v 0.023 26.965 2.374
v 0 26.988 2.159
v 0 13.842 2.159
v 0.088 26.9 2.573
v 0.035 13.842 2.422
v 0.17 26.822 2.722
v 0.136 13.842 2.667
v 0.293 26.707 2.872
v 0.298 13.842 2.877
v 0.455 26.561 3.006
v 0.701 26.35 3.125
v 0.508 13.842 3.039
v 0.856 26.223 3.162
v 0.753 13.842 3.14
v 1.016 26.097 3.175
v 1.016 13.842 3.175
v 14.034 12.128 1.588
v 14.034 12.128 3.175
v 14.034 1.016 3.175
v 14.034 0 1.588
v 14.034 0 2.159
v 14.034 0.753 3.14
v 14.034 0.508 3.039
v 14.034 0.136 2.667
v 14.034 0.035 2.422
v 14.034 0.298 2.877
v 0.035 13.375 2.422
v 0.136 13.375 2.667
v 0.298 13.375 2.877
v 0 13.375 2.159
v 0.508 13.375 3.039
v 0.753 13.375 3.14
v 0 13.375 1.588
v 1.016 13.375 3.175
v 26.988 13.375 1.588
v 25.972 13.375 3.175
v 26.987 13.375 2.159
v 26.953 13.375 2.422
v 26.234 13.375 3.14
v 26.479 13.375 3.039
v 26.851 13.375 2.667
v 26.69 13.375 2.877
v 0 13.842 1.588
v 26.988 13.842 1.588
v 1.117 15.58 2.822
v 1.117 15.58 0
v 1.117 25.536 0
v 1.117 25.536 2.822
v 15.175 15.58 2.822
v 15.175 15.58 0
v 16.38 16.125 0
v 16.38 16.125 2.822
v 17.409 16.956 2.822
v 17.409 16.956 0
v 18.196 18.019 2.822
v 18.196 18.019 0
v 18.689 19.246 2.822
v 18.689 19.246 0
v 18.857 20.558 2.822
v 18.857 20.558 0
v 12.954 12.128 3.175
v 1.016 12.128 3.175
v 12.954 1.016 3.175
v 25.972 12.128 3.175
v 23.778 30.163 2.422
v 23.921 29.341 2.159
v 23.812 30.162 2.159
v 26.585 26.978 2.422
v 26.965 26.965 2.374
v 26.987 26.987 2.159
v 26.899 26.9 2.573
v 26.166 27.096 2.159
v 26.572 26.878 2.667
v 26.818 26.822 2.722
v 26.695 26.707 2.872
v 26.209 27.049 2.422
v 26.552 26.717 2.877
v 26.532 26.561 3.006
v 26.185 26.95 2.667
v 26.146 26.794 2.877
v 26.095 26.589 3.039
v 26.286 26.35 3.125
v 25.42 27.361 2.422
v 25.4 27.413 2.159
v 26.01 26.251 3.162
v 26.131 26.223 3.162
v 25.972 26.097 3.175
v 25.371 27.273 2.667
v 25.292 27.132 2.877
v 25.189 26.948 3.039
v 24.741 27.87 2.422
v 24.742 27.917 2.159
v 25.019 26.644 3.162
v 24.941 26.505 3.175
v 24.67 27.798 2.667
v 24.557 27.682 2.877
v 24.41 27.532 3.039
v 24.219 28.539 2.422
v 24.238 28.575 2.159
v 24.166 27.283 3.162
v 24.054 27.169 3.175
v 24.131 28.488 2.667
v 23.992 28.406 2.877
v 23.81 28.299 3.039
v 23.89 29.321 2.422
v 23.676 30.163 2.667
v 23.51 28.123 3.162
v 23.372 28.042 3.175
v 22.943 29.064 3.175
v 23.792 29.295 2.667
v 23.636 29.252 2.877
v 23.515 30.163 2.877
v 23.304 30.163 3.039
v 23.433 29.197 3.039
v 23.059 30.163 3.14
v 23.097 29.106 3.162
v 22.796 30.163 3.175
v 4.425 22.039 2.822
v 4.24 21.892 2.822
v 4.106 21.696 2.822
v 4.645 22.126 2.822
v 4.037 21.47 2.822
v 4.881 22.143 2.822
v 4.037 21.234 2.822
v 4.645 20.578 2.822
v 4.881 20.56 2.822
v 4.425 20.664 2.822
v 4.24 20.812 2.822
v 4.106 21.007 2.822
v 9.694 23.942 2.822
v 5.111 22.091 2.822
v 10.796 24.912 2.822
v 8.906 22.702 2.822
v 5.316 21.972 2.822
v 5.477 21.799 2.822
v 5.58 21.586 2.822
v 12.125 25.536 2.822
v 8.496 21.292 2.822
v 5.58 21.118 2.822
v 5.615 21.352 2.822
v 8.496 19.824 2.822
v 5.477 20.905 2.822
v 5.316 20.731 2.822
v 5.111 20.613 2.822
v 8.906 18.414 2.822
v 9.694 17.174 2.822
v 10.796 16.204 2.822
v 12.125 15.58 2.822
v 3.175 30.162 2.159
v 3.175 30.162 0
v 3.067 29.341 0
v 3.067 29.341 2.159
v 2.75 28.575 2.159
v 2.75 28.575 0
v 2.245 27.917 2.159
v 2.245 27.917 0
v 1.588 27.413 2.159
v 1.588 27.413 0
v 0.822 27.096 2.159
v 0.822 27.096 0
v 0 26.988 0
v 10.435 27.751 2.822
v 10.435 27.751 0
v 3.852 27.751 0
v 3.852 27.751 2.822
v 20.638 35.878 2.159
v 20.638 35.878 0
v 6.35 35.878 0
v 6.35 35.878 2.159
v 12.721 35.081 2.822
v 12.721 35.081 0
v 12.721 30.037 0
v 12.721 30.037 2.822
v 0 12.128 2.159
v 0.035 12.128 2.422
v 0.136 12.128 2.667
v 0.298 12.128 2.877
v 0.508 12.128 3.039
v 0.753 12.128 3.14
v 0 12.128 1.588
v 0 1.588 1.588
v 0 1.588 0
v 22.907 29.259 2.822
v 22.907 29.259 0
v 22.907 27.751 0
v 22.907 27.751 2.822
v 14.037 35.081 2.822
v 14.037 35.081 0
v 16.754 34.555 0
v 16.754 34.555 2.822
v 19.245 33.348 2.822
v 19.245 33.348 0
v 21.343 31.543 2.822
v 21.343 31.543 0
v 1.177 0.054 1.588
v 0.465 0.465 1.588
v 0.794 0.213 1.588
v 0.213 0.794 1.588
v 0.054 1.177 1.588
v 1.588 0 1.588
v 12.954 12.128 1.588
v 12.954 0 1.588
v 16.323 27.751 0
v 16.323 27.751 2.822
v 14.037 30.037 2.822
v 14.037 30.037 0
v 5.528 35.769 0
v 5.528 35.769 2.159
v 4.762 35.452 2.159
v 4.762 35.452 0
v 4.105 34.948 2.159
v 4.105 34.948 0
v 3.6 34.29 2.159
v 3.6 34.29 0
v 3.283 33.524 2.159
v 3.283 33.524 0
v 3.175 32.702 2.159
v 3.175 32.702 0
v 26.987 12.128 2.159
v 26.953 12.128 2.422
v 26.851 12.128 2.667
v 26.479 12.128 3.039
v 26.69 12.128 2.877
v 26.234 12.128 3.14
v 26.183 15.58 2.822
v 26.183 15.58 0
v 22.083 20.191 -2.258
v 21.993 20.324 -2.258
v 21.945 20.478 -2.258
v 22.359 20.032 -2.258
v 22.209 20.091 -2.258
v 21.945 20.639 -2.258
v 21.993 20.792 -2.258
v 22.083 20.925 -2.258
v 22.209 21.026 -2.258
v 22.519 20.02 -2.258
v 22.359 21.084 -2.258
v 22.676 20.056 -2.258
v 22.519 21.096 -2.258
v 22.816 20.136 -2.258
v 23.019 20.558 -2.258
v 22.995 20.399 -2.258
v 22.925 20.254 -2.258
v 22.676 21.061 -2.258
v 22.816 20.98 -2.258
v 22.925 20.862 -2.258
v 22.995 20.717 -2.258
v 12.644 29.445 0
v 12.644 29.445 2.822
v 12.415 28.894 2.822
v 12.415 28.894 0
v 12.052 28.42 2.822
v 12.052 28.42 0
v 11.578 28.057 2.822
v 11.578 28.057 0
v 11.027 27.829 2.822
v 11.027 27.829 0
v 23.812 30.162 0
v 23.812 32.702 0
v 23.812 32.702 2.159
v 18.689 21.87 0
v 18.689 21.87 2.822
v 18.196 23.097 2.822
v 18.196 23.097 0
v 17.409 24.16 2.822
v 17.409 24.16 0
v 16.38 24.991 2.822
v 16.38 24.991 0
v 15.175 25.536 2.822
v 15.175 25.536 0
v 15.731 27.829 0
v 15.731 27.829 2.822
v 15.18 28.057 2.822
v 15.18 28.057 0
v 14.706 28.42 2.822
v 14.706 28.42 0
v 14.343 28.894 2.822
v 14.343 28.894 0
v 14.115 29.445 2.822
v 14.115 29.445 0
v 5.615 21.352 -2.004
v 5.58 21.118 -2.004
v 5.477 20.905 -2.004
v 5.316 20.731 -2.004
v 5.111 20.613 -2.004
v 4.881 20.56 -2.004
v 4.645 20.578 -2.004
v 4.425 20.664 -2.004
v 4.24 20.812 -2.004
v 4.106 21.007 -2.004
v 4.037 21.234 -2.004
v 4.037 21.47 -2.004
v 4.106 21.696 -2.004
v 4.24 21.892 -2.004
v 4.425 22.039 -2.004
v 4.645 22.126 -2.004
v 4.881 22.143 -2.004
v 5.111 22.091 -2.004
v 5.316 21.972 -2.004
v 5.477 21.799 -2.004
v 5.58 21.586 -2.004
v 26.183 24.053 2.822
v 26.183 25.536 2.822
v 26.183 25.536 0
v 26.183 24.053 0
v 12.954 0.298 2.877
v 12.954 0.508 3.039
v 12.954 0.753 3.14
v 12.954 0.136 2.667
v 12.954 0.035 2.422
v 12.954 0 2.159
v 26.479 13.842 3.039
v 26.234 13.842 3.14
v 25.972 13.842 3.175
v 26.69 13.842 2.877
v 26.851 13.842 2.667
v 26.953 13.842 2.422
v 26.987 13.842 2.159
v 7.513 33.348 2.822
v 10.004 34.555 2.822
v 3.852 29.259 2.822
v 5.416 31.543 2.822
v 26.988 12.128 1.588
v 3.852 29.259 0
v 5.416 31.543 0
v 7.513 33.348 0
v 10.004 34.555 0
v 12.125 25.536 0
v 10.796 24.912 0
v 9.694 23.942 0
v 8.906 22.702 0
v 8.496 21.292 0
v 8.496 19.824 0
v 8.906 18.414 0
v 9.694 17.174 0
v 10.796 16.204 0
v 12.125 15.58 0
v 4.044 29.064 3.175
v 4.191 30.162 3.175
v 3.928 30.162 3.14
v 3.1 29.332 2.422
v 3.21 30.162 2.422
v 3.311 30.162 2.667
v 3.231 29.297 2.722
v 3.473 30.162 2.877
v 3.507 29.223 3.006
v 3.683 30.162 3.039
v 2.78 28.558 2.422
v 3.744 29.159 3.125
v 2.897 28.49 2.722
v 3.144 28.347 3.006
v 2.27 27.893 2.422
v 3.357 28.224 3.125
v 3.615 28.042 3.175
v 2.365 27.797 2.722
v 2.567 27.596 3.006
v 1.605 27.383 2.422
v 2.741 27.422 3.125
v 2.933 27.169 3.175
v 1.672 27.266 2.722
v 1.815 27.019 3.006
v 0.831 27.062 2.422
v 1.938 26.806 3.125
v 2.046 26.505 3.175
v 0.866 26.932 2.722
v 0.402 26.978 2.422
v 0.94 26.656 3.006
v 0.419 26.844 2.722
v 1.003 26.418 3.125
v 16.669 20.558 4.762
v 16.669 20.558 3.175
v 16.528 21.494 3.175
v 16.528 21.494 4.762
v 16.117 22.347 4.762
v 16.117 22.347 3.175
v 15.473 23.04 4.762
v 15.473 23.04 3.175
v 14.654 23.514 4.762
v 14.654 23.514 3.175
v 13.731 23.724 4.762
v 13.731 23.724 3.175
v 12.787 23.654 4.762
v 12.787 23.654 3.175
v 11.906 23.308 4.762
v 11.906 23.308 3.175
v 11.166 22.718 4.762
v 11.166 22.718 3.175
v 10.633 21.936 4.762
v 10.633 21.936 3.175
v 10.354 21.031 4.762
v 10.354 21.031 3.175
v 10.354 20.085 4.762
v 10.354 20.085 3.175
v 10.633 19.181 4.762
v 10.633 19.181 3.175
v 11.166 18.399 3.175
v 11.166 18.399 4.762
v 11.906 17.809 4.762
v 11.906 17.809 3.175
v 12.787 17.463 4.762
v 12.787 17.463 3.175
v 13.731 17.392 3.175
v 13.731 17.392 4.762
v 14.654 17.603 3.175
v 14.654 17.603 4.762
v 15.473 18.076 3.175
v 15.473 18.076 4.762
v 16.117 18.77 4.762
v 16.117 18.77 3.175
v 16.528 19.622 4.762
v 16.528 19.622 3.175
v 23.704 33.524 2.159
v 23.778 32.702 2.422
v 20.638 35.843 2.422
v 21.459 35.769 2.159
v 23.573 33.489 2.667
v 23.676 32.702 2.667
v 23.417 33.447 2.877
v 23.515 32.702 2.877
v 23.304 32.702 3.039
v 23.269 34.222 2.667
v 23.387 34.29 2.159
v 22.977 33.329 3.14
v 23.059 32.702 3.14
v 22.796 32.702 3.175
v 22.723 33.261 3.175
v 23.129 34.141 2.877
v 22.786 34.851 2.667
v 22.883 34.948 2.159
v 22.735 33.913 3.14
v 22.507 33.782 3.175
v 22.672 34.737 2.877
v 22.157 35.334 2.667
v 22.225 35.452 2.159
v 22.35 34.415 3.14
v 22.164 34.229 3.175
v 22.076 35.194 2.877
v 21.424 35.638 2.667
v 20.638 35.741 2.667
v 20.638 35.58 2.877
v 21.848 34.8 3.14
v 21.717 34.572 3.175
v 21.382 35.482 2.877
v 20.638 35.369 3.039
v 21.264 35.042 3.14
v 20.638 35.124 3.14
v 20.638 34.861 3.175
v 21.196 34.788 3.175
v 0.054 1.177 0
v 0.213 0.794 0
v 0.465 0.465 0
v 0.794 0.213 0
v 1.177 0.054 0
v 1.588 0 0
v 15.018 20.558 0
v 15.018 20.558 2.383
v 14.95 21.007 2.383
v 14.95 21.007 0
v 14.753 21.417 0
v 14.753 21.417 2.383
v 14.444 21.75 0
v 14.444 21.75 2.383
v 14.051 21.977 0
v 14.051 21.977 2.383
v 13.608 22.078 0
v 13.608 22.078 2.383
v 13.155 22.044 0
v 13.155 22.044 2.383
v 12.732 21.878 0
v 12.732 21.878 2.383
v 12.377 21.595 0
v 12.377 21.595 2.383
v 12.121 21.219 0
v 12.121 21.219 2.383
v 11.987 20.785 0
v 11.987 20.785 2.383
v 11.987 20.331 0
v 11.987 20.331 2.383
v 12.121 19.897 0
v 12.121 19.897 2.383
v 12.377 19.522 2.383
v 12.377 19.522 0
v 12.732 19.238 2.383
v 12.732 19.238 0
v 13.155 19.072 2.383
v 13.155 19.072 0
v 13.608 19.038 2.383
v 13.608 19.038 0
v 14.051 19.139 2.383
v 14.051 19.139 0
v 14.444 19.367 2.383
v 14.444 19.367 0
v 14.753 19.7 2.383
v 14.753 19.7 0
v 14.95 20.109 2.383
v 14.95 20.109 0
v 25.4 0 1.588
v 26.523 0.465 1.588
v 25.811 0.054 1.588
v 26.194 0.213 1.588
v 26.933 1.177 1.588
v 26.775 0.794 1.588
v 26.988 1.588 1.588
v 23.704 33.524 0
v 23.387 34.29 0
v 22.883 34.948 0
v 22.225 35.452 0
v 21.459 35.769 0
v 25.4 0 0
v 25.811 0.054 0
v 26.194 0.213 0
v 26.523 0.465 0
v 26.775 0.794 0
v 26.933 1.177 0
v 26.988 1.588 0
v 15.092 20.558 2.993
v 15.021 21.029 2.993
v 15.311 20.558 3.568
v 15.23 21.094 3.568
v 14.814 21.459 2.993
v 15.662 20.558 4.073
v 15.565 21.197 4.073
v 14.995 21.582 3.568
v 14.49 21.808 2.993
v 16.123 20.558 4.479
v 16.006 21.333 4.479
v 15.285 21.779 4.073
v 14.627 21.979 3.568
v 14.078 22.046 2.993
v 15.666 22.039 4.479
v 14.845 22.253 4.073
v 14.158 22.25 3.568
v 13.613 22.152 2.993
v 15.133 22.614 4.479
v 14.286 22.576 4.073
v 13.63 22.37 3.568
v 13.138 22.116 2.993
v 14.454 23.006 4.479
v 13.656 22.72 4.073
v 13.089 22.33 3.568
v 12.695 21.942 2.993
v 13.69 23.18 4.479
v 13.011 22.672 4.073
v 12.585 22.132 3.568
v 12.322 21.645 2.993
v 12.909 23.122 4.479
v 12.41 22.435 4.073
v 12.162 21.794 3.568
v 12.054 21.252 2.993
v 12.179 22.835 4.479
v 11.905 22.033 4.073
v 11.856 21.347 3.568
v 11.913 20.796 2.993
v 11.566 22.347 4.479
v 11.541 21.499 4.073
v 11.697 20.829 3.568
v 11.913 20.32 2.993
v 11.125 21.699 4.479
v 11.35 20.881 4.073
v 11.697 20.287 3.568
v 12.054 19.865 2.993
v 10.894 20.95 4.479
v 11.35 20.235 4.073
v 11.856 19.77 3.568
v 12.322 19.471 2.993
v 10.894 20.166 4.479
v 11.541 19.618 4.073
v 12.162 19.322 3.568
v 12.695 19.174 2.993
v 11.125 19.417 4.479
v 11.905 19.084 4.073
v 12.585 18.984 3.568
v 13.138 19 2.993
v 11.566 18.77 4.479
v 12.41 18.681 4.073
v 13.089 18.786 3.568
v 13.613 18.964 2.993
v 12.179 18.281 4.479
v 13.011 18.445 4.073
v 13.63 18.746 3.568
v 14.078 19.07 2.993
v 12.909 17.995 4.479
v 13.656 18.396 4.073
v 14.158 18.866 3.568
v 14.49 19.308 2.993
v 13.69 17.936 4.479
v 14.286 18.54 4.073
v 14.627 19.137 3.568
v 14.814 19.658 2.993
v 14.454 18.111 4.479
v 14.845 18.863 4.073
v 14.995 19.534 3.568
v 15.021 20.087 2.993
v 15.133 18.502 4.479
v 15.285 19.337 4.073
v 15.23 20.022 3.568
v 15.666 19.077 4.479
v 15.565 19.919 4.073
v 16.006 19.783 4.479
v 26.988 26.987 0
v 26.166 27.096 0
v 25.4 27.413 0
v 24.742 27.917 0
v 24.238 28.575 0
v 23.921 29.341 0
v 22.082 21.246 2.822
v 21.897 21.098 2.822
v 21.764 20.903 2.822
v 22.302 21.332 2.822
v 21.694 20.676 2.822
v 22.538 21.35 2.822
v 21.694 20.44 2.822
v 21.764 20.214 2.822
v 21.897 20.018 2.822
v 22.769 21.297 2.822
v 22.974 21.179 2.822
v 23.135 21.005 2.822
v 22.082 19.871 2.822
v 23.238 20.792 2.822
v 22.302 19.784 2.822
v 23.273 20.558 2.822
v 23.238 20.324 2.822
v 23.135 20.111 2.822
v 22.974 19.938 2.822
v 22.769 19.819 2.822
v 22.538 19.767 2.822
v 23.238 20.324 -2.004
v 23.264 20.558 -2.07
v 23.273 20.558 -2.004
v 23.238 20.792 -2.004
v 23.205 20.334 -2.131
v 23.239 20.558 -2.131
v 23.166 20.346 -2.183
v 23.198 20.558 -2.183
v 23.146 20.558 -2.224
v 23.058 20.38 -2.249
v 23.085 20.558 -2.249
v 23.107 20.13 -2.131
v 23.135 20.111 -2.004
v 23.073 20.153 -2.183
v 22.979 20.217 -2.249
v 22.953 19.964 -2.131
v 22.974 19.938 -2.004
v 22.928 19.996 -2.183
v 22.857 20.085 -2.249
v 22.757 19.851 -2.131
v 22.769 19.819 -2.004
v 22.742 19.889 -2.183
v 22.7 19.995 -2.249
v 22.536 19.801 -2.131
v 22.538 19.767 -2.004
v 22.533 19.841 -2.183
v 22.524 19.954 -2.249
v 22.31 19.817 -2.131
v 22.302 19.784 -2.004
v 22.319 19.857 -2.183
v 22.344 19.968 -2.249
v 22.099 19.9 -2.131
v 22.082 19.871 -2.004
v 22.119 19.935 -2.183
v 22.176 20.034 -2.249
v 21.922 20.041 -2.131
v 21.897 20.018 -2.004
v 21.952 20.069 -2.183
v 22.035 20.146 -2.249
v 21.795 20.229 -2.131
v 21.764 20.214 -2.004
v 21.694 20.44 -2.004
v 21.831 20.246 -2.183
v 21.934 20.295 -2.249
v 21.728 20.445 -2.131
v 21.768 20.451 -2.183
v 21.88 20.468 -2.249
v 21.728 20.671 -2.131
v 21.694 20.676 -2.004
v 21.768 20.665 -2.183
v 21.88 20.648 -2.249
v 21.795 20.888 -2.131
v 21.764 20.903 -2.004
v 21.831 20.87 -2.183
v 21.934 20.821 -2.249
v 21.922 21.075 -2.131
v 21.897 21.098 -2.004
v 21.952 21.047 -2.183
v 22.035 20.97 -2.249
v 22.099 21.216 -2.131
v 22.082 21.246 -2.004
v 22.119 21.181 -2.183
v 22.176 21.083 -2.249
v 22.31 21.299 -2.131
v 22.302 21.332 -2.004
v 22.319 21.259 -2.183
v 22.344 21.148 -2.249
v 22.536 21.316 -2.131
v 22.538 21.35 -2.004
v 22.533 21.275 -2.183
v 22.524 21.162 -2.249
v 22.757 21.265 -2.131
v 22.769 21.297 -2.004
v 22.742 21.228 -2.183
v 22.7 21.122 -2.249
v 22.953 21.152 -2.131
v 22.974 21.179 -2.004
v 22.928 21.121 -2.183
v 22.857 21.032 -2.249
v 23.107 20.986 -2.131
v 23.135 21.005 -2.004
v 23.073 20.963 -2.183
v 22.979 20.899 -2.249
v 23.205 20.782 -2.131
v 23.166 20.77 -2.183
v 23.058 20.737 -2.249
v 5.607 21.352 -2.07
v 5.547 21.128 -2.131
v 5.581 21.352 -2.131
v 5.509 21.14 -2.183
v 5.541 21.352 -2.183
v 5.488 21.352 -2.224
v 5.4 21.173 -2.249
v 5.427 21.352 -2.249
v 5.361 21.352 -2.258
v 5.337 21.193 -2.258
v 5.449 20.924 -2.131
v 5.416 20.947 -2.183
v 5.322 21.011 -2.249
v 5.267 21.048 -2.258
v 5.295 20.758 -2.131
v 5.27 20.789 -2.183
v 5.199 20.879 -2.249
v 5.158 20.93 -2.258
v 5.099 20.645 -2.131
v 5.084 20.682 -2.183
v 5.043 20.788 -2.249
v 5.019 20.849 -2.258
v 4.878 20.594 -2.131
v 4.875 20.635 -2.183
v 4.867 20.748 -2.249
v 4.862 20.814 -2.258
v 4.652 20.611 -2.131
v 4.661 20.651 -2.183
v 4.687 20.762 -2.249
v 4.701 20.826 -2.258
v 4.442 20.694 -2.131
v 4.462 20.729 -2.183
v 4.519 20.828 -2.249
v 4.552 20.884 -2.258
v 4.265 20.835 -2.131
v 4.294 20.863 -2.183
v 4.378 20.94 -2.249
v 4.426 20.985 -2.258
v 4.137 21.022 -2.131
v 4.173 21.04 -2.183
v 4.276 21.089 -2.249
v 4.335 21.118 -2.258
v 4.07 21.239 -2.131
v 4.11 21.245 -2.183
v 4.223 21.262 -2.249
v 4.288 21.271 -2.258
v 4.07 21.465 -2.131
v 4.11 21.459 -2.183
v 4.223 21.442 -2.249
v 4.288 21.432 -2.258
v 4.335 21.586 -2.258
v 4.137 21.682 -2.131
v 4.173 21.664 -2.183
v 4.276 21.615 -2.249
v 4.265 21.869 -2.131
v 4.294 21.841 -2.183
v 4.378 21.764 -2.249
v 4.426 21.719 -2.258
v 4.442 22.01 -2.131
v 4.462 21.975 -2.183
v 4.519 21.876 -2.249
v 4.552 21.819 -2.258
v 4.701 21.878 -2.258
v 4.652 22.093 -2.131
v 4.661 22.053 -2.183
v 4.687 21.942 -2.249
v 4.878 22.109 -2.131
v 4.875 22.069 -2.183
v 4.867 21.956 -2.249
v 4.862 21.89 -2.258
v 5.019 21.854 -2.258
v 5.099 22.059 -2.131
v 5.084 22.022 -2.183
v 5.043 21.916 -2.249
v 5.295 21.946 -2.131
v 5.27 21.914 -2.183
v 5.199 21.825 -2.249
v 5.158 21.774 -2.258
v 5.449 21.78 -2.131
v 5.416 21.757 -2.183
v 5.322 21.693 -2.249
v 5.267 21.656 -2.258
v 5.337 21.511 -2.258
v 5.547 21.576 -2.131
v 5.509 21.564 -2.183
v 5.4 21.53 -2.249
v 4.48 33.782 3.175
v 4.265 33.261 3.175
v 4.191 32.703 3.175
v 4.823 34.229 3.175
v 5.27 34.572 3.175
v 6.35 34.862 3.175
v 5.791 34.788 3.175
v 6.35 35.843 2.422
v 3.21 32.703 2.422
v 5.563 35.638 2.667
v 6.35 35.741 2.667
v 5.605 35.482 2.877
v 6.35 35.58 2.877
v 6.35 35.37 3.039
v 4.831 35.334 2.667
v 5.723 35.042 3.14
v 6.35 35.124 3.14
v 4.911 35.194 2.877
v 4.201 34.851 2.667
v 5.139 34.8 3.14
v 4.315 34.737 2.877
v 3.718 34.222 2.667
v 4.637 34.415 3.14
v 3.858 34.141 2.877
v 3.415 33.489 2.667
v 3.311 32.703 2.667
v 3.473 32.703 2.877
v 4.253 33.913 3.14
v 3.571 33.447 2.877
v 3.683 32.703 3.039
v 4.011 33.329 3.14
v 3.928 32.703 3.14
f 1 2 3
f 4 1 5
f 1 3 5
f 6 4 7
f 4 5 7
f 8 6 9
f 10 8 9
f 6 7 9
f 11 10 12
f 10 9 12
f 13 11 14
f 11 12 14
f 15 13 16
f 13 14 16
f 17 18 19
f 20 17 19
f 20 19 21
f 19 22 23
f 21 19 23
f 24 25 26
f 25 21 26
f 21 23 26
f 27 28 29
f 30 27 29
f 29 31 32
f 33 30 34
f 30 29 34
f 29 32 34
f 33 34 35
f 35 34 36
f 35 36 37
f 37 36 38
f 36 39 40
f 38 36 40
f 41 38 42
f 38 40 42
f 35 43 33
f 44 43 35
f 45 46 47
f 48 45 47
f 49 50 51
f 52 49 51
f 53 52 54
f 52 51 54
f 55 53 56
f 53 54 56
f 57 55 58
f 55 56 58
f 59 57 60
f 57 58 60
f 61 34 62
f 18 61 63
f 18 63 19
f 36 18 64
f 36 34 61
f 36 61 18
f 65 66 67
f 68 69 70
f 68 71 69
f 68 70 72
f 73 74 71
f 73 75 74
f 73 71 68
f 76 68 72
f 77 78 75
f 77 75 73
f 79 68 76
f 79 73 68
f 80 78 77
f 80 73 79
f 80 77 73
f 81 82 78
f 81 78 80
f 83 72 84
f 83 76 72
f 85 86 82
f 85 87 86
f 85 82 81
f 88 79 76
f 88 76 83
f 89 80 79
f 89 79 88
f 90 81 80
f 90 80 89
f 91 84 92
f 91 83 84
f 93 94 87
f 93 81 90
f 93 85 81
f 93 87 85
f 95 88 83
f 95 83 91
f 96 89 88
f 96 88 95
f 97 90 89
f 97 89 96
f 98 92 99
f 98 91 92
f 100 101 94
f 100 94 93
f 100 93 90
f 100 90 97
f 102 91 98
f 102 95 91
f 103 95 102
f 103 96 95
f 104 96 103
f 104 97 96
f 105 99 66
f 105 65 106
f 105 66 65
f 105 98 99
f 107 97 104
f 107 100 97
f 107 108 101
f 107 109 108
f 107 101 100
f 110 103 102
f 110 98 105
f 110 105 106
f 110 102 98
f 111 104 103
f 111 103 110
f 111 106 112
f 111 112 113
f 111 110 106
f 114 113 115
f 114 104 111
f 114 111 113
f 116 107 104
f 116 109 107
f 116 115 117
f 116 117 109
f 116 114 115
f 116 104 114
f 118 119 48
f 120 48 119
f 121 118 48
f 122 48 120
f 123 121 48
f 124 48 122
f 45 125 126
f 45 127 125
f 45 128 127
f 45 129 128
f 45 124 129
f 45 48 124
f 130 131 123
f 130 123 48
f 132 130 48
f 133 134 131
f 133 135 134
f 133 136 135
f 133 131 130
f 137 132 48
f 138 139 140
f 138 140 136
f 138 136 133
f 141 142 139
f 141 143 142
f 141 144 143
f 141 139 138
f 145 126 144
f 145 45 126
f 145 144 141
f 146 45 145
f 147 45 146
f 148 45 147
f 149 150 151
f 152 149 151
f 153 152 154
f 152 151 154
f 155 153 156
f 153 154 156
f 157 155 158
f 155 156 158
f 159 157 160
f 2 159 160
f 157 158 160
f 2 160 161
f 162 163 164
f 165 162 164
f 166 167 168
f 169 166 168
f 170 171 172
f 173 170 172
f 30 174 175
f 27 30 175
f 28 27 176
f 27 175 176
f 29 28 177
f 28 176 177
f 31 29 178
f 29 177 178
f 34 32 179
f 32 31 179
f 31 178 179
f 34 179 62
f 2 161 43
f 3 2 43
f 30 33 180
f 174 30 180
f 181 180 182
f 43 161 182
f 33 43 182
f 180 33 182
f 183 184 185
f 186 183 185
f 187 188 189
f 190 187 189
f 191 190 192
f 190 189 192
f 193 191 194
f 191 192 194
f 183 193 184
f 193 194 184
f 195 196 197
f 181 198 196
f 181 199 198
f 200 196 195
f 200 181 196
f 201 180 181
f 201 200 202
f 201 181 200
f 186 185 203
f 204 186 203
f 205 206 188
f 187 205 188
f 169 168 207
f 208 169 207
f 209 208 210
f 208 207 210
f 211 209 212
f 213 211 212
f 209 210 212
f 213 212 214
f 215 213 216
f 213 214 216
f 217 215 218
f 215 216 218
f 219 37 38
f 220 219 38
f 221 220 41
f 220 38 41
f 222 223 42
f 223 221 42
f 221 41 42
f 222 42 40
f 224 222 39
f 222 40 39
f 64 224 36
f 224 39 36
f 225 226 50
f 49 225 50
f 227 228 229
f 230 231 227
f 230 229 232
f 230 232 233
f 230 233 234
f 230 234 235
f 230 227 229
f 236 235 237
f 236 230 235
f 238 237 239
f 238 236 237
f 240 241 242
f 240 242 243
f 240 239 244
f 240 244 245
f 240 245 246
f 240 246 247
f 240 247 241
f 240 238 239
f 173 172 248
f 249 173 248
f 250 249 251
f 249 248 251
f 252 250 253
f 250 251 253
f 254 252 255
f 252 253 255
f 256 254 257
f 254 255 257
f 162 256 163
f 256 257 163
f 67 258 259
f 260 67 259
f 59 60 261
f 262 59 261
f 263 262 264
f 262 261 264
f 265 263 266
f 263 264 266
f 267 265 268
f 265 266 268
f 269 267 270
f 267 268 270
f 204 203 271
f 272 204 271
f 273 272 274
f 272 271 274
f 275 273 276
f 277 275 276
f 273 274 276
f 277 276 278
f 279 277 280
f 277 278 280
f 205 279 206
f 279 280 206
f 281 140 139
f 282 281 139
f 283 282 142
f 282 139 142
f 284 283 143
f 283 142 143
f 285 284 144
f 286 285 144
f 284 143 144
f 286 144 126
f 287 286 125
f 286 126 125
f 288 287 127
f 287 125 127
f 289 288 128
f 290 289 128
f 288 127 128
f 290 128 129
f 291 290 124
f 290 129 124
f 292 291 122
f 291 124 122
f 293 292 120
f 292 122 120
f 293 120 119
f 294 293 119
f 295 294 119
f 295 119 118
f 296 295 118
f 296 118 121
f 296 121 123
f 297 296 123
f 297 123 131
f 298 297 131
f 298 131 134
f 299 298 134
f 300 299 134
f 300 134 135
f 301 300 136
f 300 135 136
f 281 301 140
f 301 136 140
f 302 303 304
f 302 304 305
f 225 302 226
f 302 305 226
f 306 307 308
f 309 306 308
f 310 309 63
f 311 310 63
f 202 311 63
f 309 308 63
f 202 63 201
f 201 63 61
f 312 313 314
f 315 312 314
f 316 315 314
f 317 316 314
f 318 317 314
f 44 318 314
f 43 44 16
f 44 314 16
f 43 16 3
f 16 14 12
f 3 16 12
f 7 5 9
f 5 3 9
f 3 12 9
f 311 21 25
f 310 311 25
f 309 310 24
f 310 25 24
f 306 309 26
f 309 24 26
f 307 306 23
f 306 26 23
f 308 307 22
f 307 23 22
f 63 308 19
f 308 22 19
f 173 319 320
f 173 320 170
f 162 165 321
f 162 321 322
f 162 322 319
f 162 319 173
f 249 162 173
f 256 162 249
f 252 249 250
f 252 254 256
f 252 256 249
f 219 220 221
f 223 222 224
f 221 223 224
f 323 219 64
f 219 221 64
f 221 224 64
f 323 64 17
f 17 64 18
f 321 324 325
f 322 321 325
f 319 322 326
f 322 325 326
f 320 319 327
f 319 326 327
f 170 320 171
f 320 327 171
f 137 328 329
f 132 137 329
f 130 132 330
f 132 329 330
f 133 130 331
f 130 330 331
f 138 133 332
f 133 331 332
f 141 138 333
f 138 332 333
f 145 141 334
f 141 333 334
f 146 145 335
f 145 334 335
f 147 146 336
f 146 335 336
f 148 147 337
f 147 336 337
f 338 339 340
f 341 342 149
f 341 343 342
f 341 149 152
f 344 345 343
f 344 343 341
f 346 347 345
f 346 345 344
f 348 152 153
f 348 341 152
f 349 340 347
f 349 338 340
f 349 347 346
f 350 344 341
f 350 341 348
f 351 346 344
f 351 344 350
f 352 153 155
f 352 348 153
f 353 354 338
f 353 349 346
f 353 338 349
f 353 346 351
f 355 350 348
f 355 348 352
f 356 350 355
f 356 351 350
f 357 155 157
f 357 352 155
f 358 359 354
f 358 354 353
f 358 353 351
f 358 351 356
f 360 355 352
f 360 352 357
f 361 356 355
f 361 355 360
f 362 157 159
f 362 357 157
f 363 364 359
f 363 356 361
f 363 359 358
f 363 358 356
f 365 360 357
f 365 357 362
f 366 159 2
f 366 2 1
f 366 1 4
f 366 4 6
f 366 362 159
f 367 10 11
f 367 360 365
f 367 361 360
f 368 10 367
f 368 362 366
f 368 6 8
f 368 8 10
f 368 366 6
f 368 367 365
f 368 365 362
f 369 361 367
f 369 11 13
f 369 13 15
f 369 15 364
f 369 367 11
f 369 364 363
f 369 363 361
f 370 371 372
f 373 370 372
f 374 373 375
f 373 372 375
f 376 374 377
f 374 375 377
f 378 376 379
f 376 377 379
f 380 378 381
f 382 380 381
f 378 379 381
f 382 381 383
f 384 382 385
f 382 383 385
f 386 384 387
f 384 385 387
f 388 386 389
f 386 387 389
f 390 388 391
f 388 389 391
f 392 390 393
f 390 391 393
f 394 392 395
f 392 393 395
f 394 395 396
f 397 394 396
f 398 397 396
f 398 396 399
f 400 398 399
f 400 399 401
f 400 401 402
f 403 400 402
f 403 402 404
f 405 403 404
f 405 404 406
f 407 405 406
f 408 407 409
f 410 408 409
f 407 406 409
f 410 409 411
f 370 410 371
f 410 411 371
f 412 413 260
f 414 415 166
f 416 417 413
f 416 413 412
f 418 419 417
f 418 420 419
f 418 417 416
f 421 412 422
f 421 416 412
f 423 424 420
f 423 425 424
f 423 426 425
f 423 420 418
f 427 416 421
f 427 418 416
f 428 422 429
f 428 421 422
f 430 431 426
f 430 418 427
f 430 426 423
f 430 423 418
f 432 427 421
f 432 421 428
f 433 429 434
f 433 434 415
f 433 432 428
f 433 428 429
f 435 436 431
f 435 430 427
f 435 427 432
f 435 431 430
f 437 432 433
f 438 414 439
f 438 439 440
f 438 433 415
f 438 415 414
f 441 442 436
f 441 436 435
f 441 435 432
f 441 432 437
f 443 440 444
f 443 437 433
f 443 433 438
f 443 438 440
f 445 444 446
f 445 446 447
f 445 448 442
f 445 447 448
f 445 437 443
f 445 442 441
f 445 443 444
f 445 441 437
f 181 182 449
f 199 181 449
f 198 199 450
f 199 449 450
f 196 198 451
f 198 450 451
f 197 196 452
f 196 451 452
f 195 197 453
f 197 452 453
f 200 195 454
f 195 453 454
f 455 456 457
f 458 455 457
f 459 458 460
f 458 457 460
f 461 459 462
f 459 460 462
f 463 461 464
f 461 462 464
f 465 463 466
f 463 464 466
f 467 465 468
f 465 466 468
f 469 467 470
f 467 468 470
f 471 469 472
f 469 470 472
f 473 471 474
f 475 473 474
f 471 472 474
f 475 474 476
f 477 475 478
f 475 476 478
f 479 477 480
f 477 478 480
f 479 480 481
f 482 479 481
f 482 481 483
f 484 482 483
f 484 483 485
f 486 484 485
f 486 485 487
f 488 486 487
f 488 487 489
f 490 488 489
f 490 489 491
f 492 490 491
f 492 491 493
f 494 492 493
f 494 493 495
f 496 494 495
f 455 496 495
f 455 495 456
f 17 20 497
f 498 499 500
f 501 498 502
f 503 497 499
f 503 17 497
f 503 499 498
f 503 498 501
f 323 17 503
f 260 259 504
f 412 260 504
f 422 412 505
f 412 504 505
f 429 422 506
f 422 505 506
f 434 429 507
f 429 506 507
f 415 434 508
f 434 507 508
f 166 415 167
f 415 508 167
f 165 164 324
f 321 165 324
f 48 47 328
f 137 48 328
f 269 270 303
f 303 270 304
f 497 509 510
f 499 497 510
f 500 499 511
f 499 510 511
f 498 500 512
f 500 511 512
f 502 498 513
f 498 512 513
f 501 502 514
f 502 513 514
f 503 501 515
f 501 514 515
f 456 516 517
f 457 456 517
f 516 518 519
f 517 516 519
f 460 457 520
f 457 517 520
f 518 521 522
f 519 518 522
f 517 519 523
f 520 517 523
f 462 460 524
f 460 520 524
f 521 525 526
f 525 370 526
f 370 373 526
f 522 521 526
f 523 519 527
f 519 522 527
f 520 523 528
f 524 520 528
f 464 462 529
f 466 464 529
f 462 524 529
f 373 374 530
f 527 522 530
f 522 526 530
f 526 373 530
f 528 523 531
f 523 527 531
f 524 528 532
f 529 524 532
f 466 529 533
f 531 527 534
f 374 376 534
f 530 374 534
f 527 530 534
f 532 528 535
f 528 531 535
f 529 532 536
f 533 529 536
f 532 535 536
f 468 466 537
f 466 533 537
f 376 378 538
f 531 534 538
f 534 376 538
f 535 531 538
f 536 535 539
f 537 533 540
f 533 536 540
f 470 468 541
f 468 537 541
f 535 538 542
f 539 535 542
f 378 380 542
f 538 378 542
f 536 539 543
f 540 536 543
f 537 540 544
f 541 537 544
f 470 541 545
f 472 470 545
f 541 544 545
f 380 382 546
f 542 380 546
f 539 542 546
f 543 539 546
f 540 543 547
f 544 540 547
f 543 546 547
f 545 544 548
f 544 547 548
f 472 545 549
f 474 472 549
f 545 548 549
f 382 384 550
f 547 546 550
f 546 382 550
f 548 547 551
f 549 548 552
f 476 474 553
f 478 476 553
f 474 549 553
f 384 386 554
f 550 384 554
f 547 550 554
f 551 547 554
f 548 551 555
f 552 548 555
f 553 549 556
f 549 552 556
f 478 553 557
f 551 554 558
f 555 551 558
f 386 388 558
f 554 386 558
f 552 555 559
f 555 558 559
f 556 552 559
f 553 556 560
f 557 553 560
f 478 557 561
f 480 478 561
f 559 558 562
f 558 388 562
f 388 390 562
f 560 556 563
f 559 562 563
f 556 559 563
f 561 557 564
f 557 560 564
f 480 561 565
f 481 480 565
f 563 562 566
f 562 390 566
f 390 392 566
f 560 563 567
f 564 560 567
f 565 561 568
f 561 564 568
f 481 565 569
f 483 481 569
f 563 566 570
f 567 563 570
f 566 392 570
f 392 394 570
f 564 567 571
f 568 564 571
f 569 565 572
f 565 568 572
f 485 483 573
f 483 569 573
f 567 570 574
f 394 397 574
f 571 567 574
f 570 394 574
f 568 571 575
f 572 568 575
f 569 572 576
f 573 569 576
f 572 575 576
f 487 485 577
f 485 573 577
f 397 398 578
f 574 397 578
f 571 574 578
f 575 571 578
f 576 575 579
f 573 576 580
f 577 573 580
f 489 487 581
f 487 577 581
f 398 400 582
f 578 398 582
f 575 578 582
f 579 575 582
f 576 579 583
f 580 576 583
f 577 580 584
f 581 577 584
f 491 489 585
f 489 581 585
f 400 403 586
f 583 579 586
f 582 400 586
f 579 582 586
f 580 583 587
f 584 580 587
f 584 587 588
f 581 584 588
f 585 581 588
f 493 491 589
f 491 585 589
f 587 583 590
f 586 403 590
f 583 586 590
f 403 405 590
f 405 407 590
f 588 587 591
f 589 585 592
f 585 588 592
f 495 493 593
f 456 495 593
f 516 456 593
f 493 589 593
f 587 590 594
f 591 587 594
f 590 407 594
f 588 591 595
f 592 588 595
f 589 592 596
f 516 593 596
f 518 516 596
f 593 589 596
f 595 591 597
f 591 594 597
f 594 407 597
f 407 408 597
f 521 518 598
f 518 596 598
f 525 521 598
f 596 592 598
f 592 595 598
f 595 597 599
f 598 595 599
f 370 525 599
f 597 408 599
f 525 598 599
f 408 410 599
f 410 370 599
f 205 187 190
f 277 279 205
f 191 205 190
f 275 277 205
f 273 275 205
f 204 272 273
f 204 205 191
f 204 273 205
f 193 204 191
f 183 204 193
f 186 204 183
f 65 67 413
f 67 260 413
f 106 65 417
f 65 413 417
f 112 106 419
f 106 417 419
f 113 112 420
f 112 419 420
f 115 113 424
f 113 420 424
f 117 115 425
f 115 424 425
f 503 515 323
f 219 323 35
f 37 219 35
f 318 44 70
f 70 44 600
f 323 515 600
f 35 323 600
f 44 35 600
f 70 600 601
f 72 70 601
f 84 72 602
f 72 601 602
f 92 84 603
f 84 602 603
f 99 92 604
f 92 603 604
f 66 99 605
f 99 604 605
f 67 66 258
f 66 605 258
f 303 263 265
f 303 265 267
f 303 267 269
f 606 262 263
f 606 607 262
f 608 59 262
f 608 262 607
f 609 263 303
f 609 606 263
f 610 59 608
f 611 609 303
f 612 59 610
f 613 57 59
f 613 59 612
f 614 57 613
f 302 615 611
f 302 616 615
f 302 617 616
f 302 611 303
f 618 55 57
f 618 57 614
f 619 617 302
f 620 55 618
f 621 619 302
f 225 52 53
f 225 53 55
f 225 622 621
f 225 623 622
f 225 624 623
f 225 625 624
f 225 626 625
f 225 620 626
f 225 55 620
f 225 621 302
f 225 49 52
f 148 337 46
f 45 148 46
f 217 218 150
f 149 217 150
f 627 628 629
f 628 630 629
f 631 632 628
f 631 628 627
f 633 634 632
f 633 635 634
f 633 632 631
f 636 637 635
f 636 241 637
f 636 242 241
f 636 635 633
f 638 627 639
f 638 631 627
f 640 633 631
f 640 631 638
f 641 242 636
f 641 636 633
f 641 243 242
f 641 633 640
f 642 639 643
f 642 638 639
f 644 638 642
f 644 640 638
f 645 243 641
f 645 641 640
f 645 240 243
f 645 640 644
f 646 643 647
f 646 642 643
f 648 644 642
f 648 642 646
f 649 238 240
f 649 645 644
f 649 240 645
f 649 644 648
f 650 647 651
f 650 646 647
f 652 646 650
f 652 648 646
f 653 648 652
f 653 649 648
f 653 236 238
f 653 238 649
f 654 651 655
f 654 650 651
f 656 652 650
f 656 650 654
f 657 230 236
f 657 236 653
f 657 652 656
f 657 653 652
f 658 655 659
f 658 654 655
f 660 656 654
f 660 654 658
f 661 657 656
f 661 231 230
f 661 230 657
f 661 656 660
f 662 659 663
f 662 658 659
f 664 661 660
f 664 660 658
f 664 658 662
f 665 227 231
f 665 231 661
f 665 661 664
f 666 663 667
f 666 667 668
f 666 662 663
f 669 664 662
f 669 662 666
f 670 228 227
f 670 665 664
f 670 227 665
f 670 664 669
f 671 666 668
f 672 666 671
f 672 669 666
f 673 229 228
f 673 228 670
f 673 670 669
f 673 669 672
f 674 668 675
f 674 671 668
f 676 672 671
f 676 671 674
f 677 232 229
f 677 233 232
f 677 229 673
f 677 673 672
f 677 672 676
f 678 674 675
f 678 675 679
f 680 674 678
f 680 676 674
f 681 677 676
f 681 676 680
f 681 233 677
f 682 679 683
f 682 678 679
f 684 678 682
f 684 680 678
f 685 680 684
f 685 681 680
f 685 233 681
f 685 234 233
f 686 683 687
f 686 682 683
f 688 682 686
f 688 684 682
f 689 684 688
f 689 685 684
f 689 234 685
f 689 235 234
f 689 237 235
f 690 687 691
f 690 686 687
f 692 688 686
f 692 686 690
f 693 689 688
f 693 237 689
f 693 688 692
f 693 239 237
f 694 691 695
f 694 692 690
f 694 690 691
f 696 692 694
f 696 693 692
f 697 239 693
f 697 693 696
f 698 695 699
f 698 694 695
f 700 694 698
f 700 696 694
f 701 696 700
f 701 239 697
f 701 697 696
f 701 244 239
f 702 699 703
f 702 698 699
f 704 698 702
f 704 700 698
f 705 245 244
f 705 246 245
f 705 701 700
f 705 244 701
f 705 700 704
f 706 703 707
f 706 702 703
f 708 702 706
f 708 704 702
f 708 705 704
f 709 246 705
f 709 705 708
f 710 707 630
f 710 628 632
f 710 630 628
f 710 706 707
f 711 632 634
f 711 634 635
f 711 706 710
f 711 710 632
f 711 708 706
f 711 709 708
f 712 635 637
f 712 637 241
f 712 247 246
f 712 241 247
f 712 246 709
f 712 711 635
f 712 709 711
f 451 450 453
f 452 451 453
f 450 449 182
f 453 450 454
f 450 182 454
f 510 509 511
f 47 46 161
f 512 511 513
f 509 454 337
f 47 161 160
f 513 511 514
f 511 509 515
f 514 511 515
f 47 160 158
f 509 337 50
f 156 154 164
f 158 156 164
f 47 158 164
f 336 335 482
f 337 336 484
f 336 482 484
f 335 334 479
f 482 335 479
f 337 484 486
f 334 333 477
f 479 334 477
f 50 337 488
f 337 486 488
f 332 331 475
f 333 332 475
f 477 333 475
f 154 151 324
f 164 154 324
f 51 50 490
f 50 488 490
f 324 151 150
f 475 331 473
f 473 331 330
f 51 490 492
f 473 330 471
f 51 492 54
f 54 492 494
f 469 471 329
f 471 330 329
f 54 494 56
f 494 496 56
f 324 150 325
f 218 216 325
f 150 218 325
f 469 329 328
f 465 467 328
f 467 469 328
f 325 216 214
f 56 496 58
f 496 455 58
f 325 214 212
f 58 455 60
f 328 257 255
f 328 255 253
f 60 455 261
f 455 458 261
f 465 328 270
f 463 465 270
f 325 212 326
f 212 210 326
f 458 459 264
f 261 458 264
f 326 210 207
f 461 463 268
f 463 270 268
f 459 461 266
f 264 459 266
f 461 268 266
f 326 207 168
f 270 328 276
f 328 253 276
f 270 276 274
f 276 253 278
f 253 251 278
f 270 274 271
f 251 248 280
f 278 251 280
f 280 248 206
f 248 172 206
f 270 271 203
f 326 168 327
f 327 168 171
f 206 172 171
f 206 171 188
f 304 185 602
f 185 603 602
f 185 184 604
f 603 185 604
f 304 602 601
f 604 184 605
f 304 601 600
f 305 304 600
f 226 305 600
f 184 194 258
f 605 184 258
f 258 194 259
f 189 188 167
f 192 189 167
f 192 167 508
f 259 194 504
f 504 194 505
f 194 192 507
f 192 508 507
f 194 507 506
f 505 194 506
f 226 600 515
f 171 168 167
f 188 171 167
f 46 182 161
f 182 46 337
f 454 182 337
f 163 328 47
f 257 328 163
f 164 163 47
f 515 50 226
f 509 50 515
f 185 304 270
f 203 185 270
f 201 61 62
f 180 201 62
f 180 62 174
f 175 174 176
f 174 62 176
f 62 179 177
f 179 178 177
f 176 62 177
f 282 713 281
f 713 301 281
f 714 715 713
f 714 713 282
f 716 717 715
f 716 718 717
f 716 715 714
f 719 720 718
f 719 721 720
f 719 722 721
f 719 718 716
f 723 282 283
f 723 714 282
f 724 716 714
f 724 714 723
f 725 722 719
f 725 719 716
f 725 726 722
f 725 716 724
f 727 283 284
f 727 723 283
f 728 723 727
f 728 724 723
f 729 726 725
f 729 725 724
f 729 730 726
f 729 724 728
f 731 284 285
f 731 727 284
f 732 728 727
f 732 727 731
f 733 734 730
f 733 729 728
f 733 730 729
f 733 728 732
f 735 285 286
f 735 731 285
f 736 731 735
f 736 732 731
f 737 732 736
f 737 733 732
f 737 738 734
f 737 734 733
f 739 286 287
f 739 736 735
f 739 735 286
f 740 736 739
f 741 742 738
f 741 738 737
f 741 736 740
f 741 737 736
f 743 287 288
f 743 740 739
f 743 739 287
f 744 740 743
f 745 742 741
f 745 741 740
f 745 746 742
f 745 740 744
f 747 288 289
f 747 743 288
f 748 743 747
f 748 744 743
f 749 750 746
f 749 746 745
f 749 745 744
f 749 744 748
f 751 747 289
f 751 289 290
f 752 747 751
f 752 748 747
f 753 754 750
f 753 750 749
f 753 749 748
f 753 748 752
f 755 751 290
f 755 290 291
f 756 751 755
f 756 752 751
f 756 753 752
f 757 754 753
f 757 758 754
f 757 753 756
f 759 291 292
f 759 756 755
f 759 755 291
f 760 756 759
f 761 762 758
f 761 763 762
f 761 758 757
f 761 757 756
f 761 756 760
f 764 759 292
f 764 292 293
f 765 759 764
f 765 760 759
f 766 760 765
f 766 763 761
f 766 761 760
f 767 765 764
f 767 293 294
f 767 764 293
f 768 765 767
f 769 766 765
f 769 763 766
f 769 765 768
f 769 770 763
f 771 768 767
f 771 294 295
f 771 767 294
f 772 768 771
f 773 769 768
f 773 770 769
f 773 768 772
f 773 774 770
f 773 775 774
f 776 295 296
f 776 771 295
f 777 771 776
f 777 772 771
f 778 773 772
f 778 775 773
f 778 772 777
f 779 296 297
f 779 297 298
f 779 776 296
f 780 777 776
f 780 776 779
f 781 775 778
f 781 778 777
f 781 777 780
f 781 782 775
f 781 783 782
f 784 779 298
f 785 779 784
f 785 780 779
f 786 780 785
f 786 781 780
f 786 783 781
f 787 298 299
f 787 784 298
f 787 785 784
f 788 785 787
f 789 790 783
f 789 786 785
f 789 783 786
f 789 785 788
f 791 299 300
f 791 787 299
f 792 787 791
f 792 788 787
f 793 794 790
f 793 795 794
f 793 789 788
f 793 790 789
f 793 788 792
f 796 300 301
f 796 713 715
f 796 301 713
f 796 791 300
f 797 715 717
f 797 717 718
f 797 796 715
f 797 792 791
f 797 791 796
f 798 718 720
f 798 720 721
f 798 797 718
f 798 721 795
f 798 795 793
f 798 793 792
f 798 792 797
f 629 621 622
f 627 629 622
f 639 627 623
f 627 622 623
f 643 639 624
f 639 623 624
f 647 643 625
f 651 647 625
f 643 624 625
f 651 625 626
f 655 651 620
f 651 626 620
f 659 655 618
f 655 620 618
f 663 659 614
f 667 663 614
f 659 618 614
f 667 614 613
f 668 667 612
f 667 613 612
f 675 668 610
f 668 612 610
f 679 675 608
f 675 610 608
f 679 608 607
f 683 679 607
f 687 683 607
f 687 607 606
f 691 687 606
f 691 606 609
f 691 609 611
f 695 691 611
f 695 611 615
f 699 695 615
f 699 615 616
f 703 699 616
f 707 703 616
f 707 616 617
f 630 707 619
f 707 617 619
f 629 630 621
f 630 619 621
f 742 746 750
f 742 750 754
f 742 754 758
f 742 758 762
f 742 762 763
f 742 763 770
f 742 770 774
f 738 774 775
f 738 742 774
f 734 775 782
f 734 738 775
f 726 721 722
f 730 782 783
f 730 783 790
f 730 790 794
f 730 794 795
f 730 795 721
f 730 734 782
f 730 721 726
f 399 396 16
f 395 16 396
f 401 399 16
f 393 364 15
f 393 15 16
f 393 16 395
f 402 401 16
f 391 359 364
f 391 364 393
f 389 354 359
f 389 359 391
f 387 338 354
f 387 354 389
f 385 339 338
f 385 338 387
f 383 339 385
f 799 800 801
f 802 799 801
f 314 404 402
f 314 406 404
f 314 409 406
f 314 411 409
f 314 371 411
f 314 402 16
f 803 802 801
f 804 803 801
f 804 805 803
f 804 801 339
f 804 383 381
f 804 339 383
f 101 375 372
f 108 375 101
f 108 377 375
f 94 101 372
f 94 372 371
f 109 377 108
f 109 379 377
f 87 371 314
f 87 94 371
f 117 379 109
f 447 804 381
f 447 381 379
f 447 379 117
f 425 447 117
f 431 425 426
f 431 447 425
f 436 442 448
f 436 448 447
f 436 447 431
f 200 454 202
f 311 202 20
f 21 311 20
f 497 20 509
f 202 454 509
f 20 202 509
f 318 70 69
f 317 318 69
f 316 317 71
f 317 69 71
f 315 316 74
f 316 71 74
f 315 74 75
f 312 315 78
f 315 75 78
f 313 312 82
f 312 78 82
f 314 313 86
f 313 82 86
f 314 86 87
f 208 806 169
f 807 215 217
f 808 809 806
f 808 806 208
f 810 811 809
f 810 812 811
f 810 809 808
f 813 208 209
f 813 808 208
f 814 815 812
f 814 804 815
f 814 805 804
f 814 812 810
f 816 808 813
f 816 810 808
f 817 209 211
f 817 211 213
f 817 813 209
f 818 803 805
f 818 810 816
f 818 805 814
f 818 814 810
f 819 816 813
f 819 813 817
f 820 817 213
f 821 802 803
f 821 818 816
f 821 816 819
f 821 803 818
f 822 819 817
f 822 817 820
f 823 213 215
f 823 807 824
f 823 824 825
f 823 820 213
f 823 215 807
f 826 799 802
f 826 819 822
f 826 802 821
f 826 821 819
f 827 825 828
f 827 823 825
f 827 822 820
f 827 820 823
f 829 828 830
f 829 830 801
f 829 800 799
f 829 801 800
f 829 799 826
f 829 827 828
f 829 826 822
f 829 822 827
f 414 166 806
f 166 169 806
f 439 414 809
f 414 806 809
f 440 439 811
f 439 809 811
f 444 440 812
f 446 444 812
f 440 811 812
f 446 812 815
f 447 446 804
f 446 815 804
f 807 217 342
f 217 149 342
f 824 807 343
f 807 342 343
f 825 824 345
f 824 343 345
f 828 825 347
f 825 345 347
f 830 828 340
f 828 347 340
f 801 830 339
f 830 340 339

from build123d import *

# Parameters (mm, degrees)
F1_DEPTH  = 3.175
F2_R      = 1.016
F3_W      = 24.9555
F3_H      = 0.4668365944
F3_W_2    = 8.3583763037
F3_W_3    = 6.5895795759
F4_DEPTH  = 1.5875
F5_R      = 1.524
F6_DEPTH  = 25.4
F5_R_2    = 3.175
F7_DEPTH  = 1.5875
F9_W      = 1.294683665
F9_H      = 1.482822001
F10_DEPTH = 2.8222222222
F11_R     = 0.79375
F12_DEPTH = 5.08
F13_R     = 0.254
F15_DEPTH = 2.8222222222


# Not quite as in the source:
# - a fillet or chamfer that OpenCascade refuses, or shapes differently, is made with other operations: its cross-section is extruded or revolved along the edge and cut away or added


with BuildPart() as f1:
    # F0 (on Top) → F1 (new body)
    with BuildSketch(Plane.XY):
        with BuildLine():
            ThreePointArc((0, 1.5875), (0.4649679849, 0.4649679849), (1.5875, 0))
            Line((1.5875, 0), (25.4, 0))
            ThreePointArc((25.4, 0), (26.5225320151, 0.4649679849), (26.9875, 1.5875))
            Line((26.9875, 1.5875), (26.9875, 26.9875))
            ThreePointArc((26.9875, 26.9875), (24.7424359697, 27.9174359697), (23.8125, 30.1625))
            Line((23.8125, 30.1625), (23.8125, 32.7025))
            ThreePointArc((23.8125, 32.7025), (22.8825640303, 34.9475640303), (20.6375, 35.8775))
            Line((20.6375, 35.8775), (6.35, 35.8775))
            ThreePointArc((6.35, 35.8775), (4.1049359697, 34.9475640303), (3.175, 32.7025))
            Line((3.175, 32.7025), (3.175, 30.1625))
            ThreePointArc((3.175, 30.1625), (2.2450640303, 27.9174359697), (0, 26.9875))
            Line((0, 26.9875), (0, 1.5875))
        make_face()
    extrude(amount=F1_DEPTH)

    # F2
    f2_edges = [f1.edges().sort_by_distance(p)[0] for p in [
        (26.9875, 14.2875, 3.175),
        (3.175, 31.4325, 3.175),
        (2.245064, 27.917436, 3.175),
        (24.742436, 27.917436, 3.175),
        (23.8125, 31.4325, 3.175),
        (22.882564, 34.947564, 3.175),
        (13.49375, 35.8775, 3.175),
        (4.104936, 34.947564, 3.175),
    ]]
    fillet(f2_edges, radius=F2_R)

    # F3 (on face) → F4 (cut)
    with BuildSketch(Plane.XY.offset(3.175)):
        with BuildLine():
            Line((43.3063970949, 12.1285), (25.9715, 12.1285))
            Line((25.9715, 12.1285), (25.9715, 1.5875))
            ThreePointArc((25.9715, 1.5875), (25.8041115254, 1.1833884746), (25.4, 1.016))
            Line((25.4, 1.016), (14.0335, 1.016))
            Line((14.0335, 1.016), (14.0335, -10.401187452))
            Line((14.0335, -10.401187452), (43.3063970949, -10.401187452))
            Line((43.3063970949, -10.401187452), (43.3063970949, 12.1285))
        make_face()
        with BuildLine():
            Line((25.9715, 12.1285), (14.0335, 12.1285))
            Line((14.0335, 12.1285), (14.0335, 1.016))
            Line((14.0335, 1.016), (25.4, 1.016))
            ThreePointArc((25.4, 1.016), (25.8041115254, 1.1833884746), (25.9715, 1.5875))
            Line((25.9715, 1.5875), (25.9715, 12.1285))
        make_face()
        with BuildLine():
            Line((1.5875, 1.016), (12.954, 1.016))
            Line((12.954, 1.016), (12.954, 12.1285))
            Line((12.954, 12.1285), (1.016, 12.1285))
            Line((1.016, 12.1285), (1.016, 1.5875))
            ThreePointArc((1.016, 1.5875), (1.1833884746, 1.1833884746), (1.5875, 1.016))
        make_face()
        with BuildLine():
            Line((12.954, -10.9148975462), (12.954, 1.016))
            Line((12.954, 1.016), (1.5875, 1.016))
            ThreePointArc((1.5875, 1.016), (1.1833884746, 1.1833884746), (1.016, 1.5875))
            Line((1.016, 1.5875), (1.016, 12.1285))
            Line((1.016, 12.1285), (-5.5735795759, 12.1285))
            Line((-5.5735795759, 12.1285), (-5.5735795759, -10.9148975462))
            Line((-5.5735795759, -10.9148975462), (12.954, -10.9148975462))
        make_face()
        with Locations((13.49375, 13.6085897574)):
            Rectangle(F3_W, F3_H)
        with Locations((30.1506881518, 13.6085897574)):
            Rectangle(F3_W_2, F3_H)
        with Locations((-2.2787897879, 13.6085897574)):
            Rectangle(F3_W_3, F3_H)
    extrude(amount=-F4_DEPTH, mode=Mode.SUBTRACT)

    # F5 (on face) → F6 (cut)
    with BuildSketch(Plane.XY.offset(3.175)):
        with Locations((13.49375, 20.5581425011)):
            Circle(F5_R)
    extrude(amount=-F6_DEPTH, mode=Mode.SUBTRACT)

    # F5 (on face) → F7 (join)
    with BuildSketch(Plane.XY.offset(3.175)):
        with Locations((13.49375, 20.5581425011)):
            Circle(F5_R_2)
        with Locations((13.49375, 20.5581425011)):
            Circle(F5_R, mode=Mode.SUBTRACT)
    extrude(amount=F7_DEPTH)

    # F8: fillet of radius 2.54 on 1 edges, made by hand

    # F8_s1 → F8_t2 (revolve, cut)
    with BuildSketch(Plane.XZ.offset(-20.5581425011)):
        with BuildLine():
            ThreePointArc((15.01775, 2.3831557626), (15.4709270559, 3.8311785525), (16.66875, 4.7625))
            Line((16.66875, 4.7625), (15.01775, 4.7625))
            Line((15.01775, 4.7625), (15.01775, 2.3831557626))
        make_face()
    revolve(axis=Axis((13.49375, 20.5581425011, 4.7625), (0, 0, 1)), mode=Mode.SUBTRACT)

    # F9 (on face) → F10 (cut)
    with BuildSketch(Plane(origin=(0, 0, 0), x_dir=(1, 0, 0), z_dir=(0, 0, -1))):
        with BuildLine():
            ThreePointArc((15.1753826067, -15.5802866697), (17.8362583784, -17.462592513), (18.8565061088, -20.5581425011))
            Line((18.8565061088, -20.5581425011), (26.1830221862, -20.5581425011))
            Line((26.1830221862, -20.5581425011), (26.1830221862, -15.5802866697))
            Line((26.1830221862, -15.5802866697), (15.1753826067, -15.5802866697))
        make_face()
        with BuildLine():
            Line((26.1830221862, -20.5581425011), (18.8565061088, -20.5581425011))
            ThreePointArc((18.8565061088, -20.5581425011), (17.8362583784, -23.6536924892), (15.1753826067, -25.5359983325))
            Line((15.1753826067, -25.5359983325), (24.8883385211, -25.5359983325))
            Line((24.8883385211, -25.5359983325), (24.8883385211, -24.0531763315))
            Line((24.8883385211, -24.0531763315), (26.1830221862, -24.0531763315))
            Line((26.1830221862, -24.0531763315), (26.1830221862, -20.5581425011))
        make_face()
        with Locations((25.5356803536, -24.794587332)):
            Rectangle(F9_W, F9_H)
        with BuildLine():
            Line((12.1251240555, -15.5802866697), (1.117484476, -15.5802866697))
            Line((1.117484476, -15.5802866697), (1.117484476, -20.5581425011))
            Line((1.117484476, -20.5581425011), (1.117484476, -25.5359983325))
            Line((1.117484476, -25.5359983325), (12.1251240555, -25.5359983325))
            ThreePointArc((12.1251240555, -25.5359983325), (8.4440005534, -20.5581425011), (12.1251240555, -15.5802866697))
        make_face()
    extrude(amount=-F10_DEPTH, mode=Mode.SUBTRACT)

    # F11 (on face) → F12 (join)
    with BuildSketch(Plane(origin=(0, 0, 2.8222222222), x_dir=(1, 0, 0), z_dir=(0, 0, -1))):
        with Locations((22.4790647626, -20.5581425011)):
            Circle(F11_R)
        with Locations((4.8214418996, -21.3518925011)):
            Circle(F11_R)
    extrude(amount=F12_DEPTH)

    # F13
    f13_edges = [f1.edges().sort_by_distance(p)[0] for p in [
        (21.685315, 20.558143, -2.257778),
        (4.027692, 21.351893, -2.257778),
    ]]
    fillet(f13_edges, radius=F13_R)

    # F14 (on face) → F15 (cut)
    with BuildSketch(Plane(origin=(0, 0, 0), x_dir=(1, 0, 0), z_dir=(0, 0, -1))):
        with BuildLine():
            Line((10.4354891836, -27.7508334085), (3.8518141955, -27.7508334085))
            Line((3.8518141955, -27.7508334085), (3.8518141955, -29.2588919401))
            ThreePointArc((3.8518141955, -29.2588919401), (7.5132373167, -33.3483248509), (12.7214891836, -35.0814126432))
            Line((12.7214891836, -35.0814126432), (12.7214891836, -30.0368334085))
            ThreePointArc((12.7214891836, -30.0368334085), (12.0519352854, -28.4203873067), (10.4354891836, -27.7508334085))
        make_face()
        with BuildLine():
            ThreePointArc((14.0368680542, -35.0814126432), (19.2451199211, -33.3483248509), (22.9065430423, -29.2588919401))
            Line((22.9065430423, -29.2588919401), (22.9065430423, -27.7508334085))
            Line((22.9065430423, -27.7508334085), (16.3228680542, -27.7508334085))
            ThreePointArc((16.3228680542, -27.7508334085), (14.7064219524, -28.4203873067), (14.0368680542, -30.0368334085))
            Line((14.0368680542, -30.0368334085), (14.0368680542, -35.0814126432))
        make_face()
    extrude(amount=-F15_DEPTH, mode=Mode.SUBTRACT)


solid = f1.part
